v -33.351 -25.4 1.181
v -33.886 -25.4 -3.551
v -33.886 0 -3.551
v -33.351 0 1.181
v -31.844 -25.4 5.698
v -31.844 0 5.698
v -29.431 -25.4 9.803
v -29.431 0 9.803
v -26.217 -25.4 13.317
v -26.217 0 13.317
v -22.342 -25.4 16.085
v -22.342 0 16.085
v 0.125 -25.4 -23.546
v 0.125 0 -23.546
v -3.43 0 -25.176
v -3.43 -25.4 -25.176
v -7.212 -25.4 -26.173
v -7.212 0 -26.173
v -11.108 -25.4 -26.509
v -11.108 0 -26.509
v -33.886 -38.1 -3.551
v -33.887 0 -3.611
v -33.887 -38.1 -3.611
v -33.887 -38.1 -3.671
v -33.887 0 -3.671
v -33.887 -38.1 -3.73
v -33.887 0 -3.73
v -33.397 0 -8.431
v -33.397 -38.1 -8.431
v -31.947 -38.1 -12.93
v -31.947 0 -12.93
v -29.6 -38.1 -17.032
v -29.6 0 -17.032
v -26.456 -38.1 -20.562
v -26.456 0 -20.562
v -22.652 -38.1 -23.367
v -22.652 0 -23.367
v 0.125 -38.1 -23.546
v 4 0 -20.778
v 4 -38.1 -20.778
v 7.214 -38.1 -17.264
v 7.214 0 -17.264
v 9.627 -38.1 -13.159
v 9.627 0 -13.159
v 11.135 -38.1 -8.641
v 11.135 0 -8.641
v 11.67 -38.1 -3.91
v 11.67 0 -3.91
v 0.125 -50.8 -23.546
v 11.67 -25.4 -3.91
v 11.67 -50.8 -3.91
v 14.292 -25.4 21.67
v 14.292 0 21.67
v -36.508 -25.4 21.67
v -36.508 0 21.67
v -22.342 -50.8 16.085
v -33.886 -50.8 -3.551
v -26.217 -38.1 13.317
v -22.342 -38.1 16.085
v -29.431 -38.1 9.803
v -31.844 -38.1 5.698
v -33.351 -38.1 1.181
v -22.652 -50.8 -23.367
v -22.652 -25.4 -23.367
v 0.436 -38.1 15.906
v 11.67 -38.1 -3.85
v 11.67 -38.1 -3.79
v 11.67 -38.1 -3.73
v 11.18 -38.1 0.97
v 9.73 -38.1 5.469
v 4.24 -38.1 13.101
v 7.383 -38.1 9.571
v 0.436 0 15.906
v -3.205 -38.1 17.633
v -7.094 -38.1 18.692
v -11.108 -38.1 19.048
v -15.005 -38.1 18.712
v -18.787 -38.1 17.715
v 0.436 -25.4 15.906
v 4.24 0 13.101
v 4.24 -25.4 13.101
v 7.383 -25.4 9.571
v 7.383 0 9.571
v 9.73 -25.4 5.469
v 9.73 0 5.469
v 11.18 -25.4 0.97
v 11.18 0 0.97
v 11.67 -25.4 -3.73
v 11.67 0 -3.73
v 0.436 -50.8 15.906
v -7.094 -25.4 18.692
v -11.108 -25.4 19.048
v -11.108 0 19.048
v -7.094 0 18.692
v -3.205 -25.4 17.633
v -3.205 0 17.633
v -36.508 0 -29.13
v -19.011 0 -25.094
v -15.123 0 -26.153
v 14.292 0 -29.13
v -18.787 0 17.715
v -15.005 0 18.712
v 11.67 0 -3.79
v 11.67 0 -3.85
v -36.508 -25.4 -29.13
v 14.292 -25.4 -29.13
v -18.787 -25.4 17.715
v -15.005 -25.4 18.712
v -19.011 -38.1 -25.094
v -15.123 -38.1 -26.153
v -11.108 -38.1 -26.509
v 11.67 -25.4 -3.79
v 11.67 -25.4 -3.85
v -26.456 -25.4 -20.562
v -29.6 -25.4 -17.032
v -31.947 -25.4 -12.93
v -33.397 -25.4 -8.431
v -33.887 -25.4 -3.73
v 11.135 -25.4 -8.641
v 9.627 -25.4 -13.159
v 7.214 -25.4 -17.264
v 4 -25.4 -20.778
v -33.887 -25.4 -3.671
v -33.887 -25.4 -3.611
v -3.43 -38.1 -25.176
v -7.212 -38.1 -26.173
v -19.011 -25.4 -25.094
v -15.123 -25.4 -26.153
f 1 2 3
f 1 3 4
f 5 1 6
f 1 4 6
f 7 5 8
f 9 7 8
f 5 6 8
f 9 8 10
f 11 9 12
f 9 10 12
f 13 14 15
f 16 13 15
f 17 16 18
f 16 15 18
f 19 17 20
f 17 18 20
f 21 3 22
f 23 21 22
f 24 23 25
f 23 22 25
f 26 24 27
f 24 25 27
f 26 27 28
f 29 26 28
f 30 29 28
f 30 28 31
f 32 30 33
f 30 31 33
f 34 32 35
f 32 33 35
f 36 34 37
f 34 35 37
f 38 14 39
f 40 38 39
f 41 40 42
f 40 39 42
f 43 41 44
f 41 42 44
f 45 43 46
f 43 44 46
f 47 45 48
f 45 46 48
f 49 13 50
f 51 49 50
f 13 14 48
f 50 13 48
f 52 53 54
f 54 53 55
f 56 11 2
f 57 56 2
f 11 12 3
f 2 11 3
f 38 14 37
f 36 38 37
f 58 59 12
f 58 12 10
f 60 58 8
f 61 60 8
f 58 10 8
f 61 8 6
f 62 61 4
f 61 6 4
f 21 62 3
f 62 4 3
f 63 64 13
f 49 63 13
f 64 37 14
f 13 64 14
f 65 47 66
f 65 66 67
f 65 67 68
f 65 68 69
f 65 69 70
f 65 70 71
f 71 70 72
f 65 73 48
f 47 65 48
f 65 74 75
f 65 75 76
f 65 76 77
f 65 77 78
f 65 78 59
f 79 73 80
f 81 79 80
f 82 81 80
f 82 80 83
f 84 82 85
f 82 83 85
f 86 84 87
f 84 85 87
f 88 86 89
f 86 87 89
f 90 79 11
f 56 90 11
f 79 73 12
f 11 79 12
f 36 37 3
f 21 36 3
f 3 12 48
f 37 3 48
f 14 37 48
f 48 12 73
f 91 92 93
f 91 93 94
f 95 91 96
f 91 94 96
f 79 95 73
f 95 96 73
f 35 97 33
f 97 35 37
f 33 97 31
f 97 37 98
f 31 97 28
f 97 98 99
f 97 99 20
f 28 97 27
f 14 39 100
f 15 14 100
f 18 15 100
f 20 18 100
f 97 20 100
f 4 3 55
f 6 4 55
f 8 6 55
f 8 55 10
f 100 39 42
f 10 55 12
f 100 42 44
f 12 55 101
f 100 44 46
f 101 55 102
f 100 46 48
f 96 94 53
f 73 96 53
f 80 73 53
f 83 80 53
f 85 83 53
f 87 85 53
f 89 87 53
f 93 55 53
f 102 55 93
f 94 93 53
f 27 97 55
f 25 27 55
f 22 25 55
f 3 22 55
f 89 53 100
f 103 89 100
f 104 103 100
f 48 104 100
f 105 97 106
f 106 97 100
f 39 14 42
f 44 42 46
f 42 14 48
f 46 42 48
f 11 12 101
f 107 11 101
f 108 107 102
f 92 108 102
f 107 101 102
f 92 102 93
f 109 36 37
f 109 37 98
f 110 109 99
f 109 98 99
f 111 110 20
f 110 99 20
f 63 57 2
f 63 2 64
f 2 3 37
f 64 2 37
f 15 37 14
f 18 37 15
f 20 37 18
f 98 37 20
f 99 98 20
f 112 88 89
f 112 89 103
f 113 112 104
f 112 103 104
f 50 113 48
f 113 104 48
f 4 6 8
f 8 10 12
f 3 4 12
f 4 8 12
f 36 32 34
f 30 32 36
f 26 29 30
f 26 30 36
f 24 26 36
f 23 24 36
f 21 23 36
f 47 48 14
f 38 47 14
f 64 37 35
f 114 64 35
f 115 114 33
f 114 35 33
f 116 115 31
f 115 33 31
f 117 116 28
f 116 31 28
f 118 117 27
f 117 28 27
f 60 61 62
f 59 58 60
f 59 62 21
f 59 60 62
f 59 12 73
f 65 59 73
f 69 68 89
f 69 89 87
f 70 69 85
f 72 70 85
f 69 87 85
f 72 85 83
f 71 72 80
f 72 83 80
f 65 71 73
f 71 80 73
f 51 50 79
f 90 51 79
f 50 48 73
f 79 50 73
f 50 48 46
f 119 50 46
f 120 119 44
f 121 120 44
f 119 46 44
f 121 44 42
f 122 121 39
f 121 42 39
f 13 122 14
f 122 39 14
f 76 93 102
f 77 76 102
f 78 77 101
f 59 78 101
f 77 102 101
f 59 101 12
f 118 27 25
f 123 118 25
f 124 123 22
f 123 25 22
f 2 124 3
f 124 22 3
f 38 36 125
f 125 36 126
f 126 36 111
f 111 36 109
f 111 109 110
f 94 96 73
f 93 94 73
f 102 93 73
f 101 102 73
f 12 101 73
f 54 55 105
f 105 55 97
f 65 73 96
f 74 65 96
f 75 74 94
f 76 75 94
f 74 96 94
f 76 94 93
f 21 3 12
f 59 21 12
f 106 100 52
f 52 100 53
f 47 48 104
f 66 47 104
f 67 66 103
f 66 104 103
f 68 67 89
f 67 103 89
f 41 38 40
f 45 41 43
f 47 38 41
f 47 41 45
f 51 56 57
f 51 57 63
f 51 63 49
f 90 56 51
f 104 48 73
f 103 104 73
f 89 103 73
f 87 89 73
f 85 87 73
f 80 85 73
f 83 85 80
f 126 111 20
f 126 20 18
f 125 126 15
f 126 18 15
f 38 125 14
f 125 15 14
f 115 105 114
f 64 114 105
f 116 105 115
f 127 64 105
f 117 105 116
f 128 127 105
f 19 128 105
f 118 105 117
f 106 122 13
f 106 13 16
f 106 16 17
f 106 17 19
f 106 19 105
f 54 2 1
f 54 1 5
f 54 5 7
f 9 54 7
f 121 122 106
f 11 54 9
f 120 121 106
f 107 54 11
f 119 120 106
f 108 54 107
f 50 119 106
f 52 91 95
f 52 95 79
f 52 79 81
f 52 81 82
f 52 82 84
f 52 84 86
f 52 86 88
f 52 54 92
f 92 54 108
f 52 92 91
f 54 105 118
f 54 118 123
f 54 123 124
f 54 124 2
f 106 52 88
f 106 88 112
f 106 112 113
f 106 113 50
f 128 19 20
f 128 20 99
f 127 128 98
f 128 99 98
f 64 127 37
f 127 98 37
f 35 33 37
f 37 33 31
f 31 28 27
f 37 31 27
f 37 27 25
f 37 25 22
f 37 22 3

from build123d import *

# Parameters (mm, degrees)
F1_DEPTH = 25.4
F2_DEPTH = 50.8
F3_DEPTH = 38.1


with BuildPart() as f1:
    # F0 (on Front) → F1 (new body)
    with BuildSketch(Plane.XZ):
        with BuildLine():
            Line((14.291638, 21.669561), (-11.108362, 21.669561))
            Line((-11.108362, 21.669561), (-11.108362, 19.048217))
            ThreePointArc((-11.108362, 19.048217), (-5.126345, 18.248703), (0.435743, 15.906283))
            ThreePointArc((0.435743, 15.906283), (8.663163, 7.581236), (11.670295, -3.730439))
            Line((11.670295, -3.730439), (14.291638, -3.730439))
            Line((14.291638, -3.730439), (14.291638, 21.669561))
        make_face()
        with BuildLine():
            Line((-11.108362, 21.669561), (-36.508362, 21.669561))
            Line((-36.508362, 21.669561), (-36.508362, -3.730439))
            Line((-36.508362, -3.730439), (-33.887018, -3.730439))
            ThreePointArc((-33.887018, -3.730439), (-33.886842, -3.640875), (-33.886314, -3.551312))
            ThreePointArc((-33.886314, -3.551312), (-30.745084, 7.813666), (-22.342209, 16.08541))
            ThreePointArc((-22.342209, 16.08541), (-16.917354, 18.295064), (-11.108362, 19.048217))
            Line((-11.108362, 19.048217), (-11.108362, 21.669561))
        make_face()
        with BuildLine():
            Line((-33.887018, -3.730439), (-36.508362, -3.730439))
            Line((-36.508362, -3.730439), (-36.508362, -29.130439))
            Line((-36.508362, -29.130439), (-11.108362, -29.130439))
            Line((-11.108362, -29.130439), (-11.108362, -26.509096))
            ThreePointArc((-11.108362, -26.509096), (-17.090379, -25.709581), (-22.652467, -23.367161))
            ThreePointArc((-22.652467, -23.367161), (-30.879887, -15.042114), (-33.887018, -3.730439))
        make_face()
        with BuildLine():
            Line((14.291638, -29.130439), (14.291638, -3.730439))
            Line((14.291638, -3.730439), (11.670295, -3.730439))
            ThreePointArc((11.670295, -3.730439), (11.670119, -3.820003), (11.66959, -3.909566))
            ThreePointArc((11.66959, -3.909566), (8.52836, -15.274544), (0.125486, -23.546288))
            ThreePointArc((0.125486, -23.546288), (-5.29937, -25.755943), (-11.108362, -26.509096))
            Line((-11.108362, -26.509096), (-11.108362, -29.130439))
            Line((-11.108362, -29.130439), (14.291638, -29.130439))
        make_face()
    extrude(amount=F1_DEPTH)

    # F0 (on Front) → F2 (join)
    with BuildSketch(Plane.XZ):
        Polygon((11.66959, -3.909566), (0.435743, 15.906283), (-22.342209, 16.08541), (-33.886314, -3.551312), (-22.652467, -23.367161), (0.125486, -23.546288), align=None)
    extrude(amount=F2_DEPTH)


with BuildPart() as f3:
    # F0 (on Front) → F3 (new body)
    with BuildSketch(Plane.XZ):
        with BuildLine():
            Line((-33.886314, -3.551312), (-22.342209, 16.08541))
            ThreePointArc((-22.342209, 16.08541), (-30.745084, 7.813666), (-33.886314, -3.551312))
        make_face()
        with BuildLine():
            ThreePointArc((11.670295, -3.730439), (8.663163, 7.581236), (0.435743, 15.906283))
            Line((0.435743, 15.906283), (11.66959, -3.909566))
            ThreePointArc((11.66959, -3.909566), (11.670119, -3.820003), (11.670295, -3.730439))
        make_face()
        with BuildLine():
            ThreePointArc((0.435743, 15.906283), (-5.126345, 18.248703), (-11.108362, 19.048217))
            ThreePointArc((-11.108362, 19.048217), (-16.917354, 18.295064), (-22.342209, 16.08541))
            Line((-22.342209, 16.08541), (0.435743, 15.906283))
        make_face()
        with BuildLine():
            ThreePointArc((-33.886314, -3.551312), (-33.886842, -3.640875), (-33.887018, -3.730439))
            ThreePointArc((-33.887018, -3.730439), (-30.879887, -15.042114), (-22.652467, -23.367161))
            Line((-22.652467, -23.367161), (-33.886314, -3.551312))
        make_face()
        with BuildLine():
            Line((0.125486, -23.546288), (-22.652467, -23.367161))
            ThreePointArc((-22.652467, -23.367161), (-17.090379, -25.709581), (-11.108362, -26.509096))
            ThreePointArc((-11.108362, -26.509096), (-5.29937, -25.755943), (0.125486, -23.546288))
        make_face()
        with BuildLine():
            ThreePointArc((0.125486, -23.546288), (8.52836, -15.274544), (11.66959, -3.909566))
            Line((11.66959, -3.909566), (0.125486, -23.546288))
        make_face()
    extrude(amount=F3_DEPTH)


solid = Compound([f1.part, f3.part])
